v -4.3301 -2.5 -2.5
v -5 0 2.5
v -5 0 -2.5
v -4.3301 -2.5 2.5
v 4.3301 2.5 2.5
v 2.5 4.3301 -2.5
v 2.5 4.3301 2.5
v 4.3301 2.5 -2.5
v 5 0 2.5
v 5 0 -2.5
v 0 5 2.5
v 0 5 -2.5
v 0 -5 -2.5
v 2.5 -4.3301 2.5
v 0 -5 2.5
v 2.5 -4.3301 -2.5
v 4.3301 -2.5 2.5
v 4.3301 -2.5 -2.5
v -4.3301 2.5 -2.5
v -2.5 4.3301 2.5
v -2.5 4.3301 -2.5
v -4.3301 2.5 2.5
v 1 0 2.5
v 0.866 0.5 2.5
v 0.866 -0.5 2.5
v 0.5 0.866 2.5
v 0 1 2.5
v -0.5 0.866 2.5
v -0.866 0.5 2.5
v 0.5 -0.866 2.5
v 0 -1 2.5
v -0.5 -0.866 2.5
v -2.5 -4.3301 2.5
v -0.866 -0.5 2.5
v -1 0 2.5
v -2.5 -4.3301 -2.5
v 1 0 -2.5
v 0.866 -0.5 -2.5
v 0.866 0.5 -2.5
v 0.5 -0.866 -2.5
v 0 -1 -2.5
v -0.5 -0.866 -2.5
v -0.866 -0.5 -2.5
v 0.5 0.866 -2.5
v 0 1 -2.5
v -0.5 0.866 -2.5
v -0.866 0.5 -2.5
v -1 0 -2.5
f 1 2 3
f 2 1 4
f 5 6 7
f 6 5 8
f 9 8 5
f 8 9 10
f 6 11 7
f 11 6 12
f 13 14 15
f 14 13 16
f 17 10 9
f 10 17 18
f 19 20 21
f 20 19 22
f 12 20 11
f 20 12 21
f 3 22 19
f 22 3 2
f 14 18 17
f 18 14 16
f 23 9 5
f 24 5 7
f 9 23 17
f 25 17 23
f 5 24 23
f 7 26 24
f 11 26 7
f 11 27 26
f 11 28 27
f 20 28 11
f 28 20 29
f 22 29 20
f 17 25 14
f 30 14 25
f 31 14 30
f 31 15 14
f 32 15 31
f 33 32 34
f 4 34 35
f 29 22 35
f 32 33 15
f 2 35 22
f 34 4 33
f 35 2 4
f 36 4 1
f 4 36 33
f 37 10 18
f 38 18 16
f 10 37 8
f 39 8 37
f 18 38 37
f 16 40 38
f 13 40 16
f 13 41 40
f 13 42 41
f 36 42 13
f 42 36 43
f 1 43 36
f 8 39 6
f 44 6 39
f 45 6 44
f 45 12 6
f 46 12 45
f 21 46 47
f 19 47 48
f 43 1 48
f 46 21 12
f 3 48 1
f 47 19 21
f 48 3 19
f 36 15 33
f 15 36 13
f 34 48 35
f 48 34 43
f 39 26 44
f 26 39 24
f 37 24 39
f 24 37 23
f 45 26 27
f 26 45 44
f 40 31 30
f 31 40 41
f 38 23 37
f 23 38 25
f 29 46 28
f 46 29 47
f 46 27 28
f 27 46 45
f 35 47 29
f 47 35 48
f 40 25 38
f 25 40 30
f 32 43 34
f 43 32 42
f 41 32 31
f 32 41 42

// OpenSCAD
// Single connected solid: faceted cylindrical magnet with optional through-bore
module magnet_vitamin(magnet_type="cylinder", diameter=10, height=5, bore_diameter=0) {

    // Robust, non-degenerate dimensions
    d  = max(0.1, diameter);
    h  = max(0.1, height);
    bd = max(0, bore_diameter);

    // Keep bore smaller than outer diameter to avoid empty/invalid geometry
    bd_safe = (bd > 0) ? min(bd, d - 0.2) : 0;

    // Faceted look like reference
    fn_cyl = 12;

    difference() {
        // Magnet body
        if (magnet_type == "block") {
            cube([d, d, h], center=true);
        } else {
            cylinder(d=d, h=h, center=true, $fn=fn_cyl);
        }

        // Optional through-bore (cuts fully through with small margin)
        if (bd_safe > 0) {
            cylinder(d=bd_safe, h=h + 0.5, center=true, $fn=fn_cyl);
        }
    }
}

// Example usage
magnet_vitamin(magnet_type="cylinder", diameter=10, height=5, bore_diameter=2);
